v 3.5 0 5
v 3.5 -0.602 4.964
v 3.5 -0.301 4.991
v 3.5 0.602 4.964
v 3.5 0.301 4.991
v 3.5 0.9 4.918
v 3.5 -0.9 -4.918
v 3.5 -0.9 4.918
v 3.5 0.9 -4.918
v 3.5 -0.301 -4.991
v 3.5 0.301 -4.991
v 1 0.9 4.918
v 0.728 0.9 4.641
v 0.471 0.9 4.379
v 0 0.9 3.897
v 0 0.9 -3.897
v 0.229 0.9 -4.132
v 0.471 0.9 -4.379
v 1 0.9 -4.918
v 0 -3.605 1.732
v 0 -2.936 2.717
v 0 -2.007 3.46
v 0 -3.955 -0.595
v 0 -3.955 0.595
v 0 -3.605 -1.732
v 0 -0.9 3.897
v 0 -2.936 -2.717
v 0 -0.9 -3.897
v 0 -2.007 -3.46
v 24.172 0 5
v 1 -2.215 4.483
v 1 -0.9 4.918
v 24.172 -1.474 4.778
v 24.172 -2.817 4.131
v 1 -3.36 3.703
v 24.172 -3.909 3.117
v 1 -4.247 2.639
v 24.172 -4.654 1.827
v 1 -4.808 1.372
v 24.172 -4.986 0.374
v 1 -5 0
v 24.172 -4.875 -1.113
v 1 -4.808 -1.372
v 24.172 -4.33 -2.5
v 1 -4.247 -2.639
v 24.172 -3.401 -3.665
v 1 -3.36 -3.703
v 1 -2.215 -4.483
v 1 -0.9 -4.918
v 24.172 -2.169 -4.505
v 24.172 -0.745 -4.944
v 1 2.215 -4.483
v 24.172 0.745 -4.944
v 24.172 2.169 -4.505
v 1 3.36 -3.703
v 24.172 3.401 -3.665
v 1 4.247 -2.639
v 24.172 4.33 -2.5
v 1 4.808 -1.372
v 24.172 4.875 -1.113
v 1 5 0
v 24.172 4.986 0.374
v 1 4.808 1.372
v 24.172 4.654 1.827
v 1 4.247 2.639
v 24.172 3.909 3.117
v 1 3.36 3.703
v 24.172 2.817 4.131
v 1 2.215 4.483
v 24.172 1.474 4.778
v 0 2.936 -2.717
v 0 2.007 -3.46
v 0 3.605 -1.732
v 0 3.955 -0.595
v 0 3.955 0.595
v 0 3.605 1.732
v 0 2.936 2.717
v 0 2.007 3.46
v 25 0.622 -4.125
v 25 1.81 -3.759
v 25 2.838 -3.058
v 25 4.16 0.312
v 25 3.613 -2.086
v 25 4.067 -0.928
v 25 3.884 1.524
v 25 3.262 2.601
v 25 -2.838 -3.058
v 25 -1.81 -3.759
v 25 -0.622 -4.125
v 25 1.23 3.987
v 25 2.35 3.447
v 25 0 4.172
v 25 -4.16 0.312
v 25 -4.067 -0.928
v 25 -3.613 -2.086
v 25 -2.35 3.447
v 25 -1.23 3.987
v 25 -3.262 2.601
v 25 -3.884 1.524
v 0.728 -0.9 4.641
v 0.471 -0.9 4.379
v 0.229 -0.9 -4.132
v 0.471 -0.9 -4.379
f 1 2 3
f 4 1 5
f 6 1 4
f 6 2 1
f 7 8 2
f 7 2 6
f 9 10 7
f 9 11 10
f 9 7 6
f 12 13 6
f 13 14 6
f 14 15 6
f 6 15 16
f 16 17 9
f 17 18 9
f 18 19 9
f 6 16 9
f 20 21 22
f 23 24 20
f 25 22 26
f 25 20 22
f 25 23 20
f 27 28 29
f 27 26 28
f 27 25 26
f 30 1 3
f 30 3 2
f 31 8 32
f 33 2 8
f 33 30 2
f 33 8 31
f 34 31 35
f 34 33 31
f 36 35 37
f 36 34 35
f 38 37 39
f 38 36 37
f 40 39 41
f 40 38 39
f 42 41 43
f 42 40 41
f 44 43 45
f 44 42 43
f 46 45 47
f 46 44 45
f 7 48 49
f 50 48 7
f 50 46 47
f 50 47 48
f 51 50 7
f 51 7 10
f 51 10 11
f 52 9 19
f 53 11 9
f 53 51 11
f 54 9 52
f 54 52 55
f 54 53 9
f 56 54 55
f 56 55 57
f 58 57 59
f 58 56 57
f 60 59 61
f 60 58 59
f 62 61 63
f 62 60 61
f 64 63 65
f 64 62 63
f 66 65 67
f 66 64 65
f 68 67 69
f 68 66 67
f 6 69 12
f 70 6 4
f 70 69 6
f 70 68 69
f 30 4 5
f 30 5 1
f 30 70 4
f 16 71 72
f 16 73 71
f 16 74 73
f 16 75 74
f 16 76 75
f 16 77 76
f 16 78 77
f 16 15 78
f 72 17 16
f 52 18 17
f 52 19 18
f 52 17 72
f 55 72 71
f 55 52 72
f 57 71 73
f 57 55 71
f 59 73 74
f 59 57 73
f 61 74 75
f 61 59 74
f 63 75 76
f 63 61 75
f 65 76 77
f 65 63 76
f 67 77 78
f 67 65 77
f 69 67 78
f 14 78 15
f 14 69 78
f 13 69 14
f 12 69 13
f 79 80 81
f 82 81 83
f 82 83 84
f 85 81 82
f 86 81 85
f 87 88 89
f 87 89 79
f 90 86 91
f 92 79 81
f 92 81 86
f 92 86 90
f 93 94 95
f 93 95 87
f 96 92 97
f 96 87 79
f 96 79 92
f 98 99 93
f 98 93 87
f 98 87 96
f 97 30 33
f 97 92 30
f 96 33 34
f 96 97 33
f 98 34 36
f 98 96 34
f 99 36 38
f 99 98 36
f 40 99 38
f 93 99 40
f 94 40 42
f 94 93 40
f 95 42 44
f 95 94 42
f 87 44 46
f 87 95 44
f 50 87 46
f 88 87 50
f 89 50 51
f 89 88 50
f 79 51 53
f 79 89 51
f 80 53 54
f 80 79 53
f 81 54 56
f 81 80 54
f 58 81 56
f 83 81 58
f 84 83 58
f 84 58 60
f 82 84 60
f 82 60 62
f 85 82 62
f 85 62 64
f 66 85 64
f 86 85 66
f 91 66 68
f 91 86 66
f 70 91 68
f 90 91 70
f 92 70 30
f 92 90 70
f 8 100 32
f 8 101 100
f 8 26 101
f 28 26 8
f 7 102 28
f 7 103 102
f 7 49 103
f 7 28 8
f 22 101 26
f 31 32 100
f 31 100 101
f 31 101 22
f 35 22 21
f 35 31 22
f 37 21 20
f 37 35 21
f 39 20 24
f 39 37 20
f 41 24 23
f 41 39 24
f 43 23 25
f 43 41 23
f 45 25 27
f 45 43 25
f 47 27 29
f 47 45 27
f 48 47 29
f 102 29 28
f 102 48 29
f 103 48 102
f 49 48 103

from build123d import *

# Parameters (mm, degrees)
SLOT_DEPTH      = 26.980762114
SLOT_DEPTH_BACK = 26.980762114
SLOTSKE_W       = 3.5
SLOTSKE_H       = 1.8


with BuildPart() as part:
    # BodySke → Base-Revolve (revolve)
    with BuildSketch(Plane.XY, mode=Mode.PRIVATE) as base_revolve_sk:
        Polygon((0, 0), (0, 4), (1, 5), (24.172, 5), (25, 4.172), (25, 0), align=None)
    revolve(base_revolve_sk.sketch.rotate(Axis((-3.67611336, 0, 0), (1, 0, 0)), 90), axis=Axis((-3.67611336, 0, 0), (1, 0, 0)))

    # SlotSke → Slot (cut, two sides: drawn at the far end of the back side and taken through both)
    with BuildSketch(Plane.XY.offset(-SLOT_DEPTH_BACK)):
        with Locations((1.75, 0)):
            Rectangle(SLOTSKE_W, SLOTSKE_H)
    extrude(amount=SLOT_DEPTH + SLOT_DEPTH_BACK, mode=Mode.SUBTRACT)


solid = part.part
